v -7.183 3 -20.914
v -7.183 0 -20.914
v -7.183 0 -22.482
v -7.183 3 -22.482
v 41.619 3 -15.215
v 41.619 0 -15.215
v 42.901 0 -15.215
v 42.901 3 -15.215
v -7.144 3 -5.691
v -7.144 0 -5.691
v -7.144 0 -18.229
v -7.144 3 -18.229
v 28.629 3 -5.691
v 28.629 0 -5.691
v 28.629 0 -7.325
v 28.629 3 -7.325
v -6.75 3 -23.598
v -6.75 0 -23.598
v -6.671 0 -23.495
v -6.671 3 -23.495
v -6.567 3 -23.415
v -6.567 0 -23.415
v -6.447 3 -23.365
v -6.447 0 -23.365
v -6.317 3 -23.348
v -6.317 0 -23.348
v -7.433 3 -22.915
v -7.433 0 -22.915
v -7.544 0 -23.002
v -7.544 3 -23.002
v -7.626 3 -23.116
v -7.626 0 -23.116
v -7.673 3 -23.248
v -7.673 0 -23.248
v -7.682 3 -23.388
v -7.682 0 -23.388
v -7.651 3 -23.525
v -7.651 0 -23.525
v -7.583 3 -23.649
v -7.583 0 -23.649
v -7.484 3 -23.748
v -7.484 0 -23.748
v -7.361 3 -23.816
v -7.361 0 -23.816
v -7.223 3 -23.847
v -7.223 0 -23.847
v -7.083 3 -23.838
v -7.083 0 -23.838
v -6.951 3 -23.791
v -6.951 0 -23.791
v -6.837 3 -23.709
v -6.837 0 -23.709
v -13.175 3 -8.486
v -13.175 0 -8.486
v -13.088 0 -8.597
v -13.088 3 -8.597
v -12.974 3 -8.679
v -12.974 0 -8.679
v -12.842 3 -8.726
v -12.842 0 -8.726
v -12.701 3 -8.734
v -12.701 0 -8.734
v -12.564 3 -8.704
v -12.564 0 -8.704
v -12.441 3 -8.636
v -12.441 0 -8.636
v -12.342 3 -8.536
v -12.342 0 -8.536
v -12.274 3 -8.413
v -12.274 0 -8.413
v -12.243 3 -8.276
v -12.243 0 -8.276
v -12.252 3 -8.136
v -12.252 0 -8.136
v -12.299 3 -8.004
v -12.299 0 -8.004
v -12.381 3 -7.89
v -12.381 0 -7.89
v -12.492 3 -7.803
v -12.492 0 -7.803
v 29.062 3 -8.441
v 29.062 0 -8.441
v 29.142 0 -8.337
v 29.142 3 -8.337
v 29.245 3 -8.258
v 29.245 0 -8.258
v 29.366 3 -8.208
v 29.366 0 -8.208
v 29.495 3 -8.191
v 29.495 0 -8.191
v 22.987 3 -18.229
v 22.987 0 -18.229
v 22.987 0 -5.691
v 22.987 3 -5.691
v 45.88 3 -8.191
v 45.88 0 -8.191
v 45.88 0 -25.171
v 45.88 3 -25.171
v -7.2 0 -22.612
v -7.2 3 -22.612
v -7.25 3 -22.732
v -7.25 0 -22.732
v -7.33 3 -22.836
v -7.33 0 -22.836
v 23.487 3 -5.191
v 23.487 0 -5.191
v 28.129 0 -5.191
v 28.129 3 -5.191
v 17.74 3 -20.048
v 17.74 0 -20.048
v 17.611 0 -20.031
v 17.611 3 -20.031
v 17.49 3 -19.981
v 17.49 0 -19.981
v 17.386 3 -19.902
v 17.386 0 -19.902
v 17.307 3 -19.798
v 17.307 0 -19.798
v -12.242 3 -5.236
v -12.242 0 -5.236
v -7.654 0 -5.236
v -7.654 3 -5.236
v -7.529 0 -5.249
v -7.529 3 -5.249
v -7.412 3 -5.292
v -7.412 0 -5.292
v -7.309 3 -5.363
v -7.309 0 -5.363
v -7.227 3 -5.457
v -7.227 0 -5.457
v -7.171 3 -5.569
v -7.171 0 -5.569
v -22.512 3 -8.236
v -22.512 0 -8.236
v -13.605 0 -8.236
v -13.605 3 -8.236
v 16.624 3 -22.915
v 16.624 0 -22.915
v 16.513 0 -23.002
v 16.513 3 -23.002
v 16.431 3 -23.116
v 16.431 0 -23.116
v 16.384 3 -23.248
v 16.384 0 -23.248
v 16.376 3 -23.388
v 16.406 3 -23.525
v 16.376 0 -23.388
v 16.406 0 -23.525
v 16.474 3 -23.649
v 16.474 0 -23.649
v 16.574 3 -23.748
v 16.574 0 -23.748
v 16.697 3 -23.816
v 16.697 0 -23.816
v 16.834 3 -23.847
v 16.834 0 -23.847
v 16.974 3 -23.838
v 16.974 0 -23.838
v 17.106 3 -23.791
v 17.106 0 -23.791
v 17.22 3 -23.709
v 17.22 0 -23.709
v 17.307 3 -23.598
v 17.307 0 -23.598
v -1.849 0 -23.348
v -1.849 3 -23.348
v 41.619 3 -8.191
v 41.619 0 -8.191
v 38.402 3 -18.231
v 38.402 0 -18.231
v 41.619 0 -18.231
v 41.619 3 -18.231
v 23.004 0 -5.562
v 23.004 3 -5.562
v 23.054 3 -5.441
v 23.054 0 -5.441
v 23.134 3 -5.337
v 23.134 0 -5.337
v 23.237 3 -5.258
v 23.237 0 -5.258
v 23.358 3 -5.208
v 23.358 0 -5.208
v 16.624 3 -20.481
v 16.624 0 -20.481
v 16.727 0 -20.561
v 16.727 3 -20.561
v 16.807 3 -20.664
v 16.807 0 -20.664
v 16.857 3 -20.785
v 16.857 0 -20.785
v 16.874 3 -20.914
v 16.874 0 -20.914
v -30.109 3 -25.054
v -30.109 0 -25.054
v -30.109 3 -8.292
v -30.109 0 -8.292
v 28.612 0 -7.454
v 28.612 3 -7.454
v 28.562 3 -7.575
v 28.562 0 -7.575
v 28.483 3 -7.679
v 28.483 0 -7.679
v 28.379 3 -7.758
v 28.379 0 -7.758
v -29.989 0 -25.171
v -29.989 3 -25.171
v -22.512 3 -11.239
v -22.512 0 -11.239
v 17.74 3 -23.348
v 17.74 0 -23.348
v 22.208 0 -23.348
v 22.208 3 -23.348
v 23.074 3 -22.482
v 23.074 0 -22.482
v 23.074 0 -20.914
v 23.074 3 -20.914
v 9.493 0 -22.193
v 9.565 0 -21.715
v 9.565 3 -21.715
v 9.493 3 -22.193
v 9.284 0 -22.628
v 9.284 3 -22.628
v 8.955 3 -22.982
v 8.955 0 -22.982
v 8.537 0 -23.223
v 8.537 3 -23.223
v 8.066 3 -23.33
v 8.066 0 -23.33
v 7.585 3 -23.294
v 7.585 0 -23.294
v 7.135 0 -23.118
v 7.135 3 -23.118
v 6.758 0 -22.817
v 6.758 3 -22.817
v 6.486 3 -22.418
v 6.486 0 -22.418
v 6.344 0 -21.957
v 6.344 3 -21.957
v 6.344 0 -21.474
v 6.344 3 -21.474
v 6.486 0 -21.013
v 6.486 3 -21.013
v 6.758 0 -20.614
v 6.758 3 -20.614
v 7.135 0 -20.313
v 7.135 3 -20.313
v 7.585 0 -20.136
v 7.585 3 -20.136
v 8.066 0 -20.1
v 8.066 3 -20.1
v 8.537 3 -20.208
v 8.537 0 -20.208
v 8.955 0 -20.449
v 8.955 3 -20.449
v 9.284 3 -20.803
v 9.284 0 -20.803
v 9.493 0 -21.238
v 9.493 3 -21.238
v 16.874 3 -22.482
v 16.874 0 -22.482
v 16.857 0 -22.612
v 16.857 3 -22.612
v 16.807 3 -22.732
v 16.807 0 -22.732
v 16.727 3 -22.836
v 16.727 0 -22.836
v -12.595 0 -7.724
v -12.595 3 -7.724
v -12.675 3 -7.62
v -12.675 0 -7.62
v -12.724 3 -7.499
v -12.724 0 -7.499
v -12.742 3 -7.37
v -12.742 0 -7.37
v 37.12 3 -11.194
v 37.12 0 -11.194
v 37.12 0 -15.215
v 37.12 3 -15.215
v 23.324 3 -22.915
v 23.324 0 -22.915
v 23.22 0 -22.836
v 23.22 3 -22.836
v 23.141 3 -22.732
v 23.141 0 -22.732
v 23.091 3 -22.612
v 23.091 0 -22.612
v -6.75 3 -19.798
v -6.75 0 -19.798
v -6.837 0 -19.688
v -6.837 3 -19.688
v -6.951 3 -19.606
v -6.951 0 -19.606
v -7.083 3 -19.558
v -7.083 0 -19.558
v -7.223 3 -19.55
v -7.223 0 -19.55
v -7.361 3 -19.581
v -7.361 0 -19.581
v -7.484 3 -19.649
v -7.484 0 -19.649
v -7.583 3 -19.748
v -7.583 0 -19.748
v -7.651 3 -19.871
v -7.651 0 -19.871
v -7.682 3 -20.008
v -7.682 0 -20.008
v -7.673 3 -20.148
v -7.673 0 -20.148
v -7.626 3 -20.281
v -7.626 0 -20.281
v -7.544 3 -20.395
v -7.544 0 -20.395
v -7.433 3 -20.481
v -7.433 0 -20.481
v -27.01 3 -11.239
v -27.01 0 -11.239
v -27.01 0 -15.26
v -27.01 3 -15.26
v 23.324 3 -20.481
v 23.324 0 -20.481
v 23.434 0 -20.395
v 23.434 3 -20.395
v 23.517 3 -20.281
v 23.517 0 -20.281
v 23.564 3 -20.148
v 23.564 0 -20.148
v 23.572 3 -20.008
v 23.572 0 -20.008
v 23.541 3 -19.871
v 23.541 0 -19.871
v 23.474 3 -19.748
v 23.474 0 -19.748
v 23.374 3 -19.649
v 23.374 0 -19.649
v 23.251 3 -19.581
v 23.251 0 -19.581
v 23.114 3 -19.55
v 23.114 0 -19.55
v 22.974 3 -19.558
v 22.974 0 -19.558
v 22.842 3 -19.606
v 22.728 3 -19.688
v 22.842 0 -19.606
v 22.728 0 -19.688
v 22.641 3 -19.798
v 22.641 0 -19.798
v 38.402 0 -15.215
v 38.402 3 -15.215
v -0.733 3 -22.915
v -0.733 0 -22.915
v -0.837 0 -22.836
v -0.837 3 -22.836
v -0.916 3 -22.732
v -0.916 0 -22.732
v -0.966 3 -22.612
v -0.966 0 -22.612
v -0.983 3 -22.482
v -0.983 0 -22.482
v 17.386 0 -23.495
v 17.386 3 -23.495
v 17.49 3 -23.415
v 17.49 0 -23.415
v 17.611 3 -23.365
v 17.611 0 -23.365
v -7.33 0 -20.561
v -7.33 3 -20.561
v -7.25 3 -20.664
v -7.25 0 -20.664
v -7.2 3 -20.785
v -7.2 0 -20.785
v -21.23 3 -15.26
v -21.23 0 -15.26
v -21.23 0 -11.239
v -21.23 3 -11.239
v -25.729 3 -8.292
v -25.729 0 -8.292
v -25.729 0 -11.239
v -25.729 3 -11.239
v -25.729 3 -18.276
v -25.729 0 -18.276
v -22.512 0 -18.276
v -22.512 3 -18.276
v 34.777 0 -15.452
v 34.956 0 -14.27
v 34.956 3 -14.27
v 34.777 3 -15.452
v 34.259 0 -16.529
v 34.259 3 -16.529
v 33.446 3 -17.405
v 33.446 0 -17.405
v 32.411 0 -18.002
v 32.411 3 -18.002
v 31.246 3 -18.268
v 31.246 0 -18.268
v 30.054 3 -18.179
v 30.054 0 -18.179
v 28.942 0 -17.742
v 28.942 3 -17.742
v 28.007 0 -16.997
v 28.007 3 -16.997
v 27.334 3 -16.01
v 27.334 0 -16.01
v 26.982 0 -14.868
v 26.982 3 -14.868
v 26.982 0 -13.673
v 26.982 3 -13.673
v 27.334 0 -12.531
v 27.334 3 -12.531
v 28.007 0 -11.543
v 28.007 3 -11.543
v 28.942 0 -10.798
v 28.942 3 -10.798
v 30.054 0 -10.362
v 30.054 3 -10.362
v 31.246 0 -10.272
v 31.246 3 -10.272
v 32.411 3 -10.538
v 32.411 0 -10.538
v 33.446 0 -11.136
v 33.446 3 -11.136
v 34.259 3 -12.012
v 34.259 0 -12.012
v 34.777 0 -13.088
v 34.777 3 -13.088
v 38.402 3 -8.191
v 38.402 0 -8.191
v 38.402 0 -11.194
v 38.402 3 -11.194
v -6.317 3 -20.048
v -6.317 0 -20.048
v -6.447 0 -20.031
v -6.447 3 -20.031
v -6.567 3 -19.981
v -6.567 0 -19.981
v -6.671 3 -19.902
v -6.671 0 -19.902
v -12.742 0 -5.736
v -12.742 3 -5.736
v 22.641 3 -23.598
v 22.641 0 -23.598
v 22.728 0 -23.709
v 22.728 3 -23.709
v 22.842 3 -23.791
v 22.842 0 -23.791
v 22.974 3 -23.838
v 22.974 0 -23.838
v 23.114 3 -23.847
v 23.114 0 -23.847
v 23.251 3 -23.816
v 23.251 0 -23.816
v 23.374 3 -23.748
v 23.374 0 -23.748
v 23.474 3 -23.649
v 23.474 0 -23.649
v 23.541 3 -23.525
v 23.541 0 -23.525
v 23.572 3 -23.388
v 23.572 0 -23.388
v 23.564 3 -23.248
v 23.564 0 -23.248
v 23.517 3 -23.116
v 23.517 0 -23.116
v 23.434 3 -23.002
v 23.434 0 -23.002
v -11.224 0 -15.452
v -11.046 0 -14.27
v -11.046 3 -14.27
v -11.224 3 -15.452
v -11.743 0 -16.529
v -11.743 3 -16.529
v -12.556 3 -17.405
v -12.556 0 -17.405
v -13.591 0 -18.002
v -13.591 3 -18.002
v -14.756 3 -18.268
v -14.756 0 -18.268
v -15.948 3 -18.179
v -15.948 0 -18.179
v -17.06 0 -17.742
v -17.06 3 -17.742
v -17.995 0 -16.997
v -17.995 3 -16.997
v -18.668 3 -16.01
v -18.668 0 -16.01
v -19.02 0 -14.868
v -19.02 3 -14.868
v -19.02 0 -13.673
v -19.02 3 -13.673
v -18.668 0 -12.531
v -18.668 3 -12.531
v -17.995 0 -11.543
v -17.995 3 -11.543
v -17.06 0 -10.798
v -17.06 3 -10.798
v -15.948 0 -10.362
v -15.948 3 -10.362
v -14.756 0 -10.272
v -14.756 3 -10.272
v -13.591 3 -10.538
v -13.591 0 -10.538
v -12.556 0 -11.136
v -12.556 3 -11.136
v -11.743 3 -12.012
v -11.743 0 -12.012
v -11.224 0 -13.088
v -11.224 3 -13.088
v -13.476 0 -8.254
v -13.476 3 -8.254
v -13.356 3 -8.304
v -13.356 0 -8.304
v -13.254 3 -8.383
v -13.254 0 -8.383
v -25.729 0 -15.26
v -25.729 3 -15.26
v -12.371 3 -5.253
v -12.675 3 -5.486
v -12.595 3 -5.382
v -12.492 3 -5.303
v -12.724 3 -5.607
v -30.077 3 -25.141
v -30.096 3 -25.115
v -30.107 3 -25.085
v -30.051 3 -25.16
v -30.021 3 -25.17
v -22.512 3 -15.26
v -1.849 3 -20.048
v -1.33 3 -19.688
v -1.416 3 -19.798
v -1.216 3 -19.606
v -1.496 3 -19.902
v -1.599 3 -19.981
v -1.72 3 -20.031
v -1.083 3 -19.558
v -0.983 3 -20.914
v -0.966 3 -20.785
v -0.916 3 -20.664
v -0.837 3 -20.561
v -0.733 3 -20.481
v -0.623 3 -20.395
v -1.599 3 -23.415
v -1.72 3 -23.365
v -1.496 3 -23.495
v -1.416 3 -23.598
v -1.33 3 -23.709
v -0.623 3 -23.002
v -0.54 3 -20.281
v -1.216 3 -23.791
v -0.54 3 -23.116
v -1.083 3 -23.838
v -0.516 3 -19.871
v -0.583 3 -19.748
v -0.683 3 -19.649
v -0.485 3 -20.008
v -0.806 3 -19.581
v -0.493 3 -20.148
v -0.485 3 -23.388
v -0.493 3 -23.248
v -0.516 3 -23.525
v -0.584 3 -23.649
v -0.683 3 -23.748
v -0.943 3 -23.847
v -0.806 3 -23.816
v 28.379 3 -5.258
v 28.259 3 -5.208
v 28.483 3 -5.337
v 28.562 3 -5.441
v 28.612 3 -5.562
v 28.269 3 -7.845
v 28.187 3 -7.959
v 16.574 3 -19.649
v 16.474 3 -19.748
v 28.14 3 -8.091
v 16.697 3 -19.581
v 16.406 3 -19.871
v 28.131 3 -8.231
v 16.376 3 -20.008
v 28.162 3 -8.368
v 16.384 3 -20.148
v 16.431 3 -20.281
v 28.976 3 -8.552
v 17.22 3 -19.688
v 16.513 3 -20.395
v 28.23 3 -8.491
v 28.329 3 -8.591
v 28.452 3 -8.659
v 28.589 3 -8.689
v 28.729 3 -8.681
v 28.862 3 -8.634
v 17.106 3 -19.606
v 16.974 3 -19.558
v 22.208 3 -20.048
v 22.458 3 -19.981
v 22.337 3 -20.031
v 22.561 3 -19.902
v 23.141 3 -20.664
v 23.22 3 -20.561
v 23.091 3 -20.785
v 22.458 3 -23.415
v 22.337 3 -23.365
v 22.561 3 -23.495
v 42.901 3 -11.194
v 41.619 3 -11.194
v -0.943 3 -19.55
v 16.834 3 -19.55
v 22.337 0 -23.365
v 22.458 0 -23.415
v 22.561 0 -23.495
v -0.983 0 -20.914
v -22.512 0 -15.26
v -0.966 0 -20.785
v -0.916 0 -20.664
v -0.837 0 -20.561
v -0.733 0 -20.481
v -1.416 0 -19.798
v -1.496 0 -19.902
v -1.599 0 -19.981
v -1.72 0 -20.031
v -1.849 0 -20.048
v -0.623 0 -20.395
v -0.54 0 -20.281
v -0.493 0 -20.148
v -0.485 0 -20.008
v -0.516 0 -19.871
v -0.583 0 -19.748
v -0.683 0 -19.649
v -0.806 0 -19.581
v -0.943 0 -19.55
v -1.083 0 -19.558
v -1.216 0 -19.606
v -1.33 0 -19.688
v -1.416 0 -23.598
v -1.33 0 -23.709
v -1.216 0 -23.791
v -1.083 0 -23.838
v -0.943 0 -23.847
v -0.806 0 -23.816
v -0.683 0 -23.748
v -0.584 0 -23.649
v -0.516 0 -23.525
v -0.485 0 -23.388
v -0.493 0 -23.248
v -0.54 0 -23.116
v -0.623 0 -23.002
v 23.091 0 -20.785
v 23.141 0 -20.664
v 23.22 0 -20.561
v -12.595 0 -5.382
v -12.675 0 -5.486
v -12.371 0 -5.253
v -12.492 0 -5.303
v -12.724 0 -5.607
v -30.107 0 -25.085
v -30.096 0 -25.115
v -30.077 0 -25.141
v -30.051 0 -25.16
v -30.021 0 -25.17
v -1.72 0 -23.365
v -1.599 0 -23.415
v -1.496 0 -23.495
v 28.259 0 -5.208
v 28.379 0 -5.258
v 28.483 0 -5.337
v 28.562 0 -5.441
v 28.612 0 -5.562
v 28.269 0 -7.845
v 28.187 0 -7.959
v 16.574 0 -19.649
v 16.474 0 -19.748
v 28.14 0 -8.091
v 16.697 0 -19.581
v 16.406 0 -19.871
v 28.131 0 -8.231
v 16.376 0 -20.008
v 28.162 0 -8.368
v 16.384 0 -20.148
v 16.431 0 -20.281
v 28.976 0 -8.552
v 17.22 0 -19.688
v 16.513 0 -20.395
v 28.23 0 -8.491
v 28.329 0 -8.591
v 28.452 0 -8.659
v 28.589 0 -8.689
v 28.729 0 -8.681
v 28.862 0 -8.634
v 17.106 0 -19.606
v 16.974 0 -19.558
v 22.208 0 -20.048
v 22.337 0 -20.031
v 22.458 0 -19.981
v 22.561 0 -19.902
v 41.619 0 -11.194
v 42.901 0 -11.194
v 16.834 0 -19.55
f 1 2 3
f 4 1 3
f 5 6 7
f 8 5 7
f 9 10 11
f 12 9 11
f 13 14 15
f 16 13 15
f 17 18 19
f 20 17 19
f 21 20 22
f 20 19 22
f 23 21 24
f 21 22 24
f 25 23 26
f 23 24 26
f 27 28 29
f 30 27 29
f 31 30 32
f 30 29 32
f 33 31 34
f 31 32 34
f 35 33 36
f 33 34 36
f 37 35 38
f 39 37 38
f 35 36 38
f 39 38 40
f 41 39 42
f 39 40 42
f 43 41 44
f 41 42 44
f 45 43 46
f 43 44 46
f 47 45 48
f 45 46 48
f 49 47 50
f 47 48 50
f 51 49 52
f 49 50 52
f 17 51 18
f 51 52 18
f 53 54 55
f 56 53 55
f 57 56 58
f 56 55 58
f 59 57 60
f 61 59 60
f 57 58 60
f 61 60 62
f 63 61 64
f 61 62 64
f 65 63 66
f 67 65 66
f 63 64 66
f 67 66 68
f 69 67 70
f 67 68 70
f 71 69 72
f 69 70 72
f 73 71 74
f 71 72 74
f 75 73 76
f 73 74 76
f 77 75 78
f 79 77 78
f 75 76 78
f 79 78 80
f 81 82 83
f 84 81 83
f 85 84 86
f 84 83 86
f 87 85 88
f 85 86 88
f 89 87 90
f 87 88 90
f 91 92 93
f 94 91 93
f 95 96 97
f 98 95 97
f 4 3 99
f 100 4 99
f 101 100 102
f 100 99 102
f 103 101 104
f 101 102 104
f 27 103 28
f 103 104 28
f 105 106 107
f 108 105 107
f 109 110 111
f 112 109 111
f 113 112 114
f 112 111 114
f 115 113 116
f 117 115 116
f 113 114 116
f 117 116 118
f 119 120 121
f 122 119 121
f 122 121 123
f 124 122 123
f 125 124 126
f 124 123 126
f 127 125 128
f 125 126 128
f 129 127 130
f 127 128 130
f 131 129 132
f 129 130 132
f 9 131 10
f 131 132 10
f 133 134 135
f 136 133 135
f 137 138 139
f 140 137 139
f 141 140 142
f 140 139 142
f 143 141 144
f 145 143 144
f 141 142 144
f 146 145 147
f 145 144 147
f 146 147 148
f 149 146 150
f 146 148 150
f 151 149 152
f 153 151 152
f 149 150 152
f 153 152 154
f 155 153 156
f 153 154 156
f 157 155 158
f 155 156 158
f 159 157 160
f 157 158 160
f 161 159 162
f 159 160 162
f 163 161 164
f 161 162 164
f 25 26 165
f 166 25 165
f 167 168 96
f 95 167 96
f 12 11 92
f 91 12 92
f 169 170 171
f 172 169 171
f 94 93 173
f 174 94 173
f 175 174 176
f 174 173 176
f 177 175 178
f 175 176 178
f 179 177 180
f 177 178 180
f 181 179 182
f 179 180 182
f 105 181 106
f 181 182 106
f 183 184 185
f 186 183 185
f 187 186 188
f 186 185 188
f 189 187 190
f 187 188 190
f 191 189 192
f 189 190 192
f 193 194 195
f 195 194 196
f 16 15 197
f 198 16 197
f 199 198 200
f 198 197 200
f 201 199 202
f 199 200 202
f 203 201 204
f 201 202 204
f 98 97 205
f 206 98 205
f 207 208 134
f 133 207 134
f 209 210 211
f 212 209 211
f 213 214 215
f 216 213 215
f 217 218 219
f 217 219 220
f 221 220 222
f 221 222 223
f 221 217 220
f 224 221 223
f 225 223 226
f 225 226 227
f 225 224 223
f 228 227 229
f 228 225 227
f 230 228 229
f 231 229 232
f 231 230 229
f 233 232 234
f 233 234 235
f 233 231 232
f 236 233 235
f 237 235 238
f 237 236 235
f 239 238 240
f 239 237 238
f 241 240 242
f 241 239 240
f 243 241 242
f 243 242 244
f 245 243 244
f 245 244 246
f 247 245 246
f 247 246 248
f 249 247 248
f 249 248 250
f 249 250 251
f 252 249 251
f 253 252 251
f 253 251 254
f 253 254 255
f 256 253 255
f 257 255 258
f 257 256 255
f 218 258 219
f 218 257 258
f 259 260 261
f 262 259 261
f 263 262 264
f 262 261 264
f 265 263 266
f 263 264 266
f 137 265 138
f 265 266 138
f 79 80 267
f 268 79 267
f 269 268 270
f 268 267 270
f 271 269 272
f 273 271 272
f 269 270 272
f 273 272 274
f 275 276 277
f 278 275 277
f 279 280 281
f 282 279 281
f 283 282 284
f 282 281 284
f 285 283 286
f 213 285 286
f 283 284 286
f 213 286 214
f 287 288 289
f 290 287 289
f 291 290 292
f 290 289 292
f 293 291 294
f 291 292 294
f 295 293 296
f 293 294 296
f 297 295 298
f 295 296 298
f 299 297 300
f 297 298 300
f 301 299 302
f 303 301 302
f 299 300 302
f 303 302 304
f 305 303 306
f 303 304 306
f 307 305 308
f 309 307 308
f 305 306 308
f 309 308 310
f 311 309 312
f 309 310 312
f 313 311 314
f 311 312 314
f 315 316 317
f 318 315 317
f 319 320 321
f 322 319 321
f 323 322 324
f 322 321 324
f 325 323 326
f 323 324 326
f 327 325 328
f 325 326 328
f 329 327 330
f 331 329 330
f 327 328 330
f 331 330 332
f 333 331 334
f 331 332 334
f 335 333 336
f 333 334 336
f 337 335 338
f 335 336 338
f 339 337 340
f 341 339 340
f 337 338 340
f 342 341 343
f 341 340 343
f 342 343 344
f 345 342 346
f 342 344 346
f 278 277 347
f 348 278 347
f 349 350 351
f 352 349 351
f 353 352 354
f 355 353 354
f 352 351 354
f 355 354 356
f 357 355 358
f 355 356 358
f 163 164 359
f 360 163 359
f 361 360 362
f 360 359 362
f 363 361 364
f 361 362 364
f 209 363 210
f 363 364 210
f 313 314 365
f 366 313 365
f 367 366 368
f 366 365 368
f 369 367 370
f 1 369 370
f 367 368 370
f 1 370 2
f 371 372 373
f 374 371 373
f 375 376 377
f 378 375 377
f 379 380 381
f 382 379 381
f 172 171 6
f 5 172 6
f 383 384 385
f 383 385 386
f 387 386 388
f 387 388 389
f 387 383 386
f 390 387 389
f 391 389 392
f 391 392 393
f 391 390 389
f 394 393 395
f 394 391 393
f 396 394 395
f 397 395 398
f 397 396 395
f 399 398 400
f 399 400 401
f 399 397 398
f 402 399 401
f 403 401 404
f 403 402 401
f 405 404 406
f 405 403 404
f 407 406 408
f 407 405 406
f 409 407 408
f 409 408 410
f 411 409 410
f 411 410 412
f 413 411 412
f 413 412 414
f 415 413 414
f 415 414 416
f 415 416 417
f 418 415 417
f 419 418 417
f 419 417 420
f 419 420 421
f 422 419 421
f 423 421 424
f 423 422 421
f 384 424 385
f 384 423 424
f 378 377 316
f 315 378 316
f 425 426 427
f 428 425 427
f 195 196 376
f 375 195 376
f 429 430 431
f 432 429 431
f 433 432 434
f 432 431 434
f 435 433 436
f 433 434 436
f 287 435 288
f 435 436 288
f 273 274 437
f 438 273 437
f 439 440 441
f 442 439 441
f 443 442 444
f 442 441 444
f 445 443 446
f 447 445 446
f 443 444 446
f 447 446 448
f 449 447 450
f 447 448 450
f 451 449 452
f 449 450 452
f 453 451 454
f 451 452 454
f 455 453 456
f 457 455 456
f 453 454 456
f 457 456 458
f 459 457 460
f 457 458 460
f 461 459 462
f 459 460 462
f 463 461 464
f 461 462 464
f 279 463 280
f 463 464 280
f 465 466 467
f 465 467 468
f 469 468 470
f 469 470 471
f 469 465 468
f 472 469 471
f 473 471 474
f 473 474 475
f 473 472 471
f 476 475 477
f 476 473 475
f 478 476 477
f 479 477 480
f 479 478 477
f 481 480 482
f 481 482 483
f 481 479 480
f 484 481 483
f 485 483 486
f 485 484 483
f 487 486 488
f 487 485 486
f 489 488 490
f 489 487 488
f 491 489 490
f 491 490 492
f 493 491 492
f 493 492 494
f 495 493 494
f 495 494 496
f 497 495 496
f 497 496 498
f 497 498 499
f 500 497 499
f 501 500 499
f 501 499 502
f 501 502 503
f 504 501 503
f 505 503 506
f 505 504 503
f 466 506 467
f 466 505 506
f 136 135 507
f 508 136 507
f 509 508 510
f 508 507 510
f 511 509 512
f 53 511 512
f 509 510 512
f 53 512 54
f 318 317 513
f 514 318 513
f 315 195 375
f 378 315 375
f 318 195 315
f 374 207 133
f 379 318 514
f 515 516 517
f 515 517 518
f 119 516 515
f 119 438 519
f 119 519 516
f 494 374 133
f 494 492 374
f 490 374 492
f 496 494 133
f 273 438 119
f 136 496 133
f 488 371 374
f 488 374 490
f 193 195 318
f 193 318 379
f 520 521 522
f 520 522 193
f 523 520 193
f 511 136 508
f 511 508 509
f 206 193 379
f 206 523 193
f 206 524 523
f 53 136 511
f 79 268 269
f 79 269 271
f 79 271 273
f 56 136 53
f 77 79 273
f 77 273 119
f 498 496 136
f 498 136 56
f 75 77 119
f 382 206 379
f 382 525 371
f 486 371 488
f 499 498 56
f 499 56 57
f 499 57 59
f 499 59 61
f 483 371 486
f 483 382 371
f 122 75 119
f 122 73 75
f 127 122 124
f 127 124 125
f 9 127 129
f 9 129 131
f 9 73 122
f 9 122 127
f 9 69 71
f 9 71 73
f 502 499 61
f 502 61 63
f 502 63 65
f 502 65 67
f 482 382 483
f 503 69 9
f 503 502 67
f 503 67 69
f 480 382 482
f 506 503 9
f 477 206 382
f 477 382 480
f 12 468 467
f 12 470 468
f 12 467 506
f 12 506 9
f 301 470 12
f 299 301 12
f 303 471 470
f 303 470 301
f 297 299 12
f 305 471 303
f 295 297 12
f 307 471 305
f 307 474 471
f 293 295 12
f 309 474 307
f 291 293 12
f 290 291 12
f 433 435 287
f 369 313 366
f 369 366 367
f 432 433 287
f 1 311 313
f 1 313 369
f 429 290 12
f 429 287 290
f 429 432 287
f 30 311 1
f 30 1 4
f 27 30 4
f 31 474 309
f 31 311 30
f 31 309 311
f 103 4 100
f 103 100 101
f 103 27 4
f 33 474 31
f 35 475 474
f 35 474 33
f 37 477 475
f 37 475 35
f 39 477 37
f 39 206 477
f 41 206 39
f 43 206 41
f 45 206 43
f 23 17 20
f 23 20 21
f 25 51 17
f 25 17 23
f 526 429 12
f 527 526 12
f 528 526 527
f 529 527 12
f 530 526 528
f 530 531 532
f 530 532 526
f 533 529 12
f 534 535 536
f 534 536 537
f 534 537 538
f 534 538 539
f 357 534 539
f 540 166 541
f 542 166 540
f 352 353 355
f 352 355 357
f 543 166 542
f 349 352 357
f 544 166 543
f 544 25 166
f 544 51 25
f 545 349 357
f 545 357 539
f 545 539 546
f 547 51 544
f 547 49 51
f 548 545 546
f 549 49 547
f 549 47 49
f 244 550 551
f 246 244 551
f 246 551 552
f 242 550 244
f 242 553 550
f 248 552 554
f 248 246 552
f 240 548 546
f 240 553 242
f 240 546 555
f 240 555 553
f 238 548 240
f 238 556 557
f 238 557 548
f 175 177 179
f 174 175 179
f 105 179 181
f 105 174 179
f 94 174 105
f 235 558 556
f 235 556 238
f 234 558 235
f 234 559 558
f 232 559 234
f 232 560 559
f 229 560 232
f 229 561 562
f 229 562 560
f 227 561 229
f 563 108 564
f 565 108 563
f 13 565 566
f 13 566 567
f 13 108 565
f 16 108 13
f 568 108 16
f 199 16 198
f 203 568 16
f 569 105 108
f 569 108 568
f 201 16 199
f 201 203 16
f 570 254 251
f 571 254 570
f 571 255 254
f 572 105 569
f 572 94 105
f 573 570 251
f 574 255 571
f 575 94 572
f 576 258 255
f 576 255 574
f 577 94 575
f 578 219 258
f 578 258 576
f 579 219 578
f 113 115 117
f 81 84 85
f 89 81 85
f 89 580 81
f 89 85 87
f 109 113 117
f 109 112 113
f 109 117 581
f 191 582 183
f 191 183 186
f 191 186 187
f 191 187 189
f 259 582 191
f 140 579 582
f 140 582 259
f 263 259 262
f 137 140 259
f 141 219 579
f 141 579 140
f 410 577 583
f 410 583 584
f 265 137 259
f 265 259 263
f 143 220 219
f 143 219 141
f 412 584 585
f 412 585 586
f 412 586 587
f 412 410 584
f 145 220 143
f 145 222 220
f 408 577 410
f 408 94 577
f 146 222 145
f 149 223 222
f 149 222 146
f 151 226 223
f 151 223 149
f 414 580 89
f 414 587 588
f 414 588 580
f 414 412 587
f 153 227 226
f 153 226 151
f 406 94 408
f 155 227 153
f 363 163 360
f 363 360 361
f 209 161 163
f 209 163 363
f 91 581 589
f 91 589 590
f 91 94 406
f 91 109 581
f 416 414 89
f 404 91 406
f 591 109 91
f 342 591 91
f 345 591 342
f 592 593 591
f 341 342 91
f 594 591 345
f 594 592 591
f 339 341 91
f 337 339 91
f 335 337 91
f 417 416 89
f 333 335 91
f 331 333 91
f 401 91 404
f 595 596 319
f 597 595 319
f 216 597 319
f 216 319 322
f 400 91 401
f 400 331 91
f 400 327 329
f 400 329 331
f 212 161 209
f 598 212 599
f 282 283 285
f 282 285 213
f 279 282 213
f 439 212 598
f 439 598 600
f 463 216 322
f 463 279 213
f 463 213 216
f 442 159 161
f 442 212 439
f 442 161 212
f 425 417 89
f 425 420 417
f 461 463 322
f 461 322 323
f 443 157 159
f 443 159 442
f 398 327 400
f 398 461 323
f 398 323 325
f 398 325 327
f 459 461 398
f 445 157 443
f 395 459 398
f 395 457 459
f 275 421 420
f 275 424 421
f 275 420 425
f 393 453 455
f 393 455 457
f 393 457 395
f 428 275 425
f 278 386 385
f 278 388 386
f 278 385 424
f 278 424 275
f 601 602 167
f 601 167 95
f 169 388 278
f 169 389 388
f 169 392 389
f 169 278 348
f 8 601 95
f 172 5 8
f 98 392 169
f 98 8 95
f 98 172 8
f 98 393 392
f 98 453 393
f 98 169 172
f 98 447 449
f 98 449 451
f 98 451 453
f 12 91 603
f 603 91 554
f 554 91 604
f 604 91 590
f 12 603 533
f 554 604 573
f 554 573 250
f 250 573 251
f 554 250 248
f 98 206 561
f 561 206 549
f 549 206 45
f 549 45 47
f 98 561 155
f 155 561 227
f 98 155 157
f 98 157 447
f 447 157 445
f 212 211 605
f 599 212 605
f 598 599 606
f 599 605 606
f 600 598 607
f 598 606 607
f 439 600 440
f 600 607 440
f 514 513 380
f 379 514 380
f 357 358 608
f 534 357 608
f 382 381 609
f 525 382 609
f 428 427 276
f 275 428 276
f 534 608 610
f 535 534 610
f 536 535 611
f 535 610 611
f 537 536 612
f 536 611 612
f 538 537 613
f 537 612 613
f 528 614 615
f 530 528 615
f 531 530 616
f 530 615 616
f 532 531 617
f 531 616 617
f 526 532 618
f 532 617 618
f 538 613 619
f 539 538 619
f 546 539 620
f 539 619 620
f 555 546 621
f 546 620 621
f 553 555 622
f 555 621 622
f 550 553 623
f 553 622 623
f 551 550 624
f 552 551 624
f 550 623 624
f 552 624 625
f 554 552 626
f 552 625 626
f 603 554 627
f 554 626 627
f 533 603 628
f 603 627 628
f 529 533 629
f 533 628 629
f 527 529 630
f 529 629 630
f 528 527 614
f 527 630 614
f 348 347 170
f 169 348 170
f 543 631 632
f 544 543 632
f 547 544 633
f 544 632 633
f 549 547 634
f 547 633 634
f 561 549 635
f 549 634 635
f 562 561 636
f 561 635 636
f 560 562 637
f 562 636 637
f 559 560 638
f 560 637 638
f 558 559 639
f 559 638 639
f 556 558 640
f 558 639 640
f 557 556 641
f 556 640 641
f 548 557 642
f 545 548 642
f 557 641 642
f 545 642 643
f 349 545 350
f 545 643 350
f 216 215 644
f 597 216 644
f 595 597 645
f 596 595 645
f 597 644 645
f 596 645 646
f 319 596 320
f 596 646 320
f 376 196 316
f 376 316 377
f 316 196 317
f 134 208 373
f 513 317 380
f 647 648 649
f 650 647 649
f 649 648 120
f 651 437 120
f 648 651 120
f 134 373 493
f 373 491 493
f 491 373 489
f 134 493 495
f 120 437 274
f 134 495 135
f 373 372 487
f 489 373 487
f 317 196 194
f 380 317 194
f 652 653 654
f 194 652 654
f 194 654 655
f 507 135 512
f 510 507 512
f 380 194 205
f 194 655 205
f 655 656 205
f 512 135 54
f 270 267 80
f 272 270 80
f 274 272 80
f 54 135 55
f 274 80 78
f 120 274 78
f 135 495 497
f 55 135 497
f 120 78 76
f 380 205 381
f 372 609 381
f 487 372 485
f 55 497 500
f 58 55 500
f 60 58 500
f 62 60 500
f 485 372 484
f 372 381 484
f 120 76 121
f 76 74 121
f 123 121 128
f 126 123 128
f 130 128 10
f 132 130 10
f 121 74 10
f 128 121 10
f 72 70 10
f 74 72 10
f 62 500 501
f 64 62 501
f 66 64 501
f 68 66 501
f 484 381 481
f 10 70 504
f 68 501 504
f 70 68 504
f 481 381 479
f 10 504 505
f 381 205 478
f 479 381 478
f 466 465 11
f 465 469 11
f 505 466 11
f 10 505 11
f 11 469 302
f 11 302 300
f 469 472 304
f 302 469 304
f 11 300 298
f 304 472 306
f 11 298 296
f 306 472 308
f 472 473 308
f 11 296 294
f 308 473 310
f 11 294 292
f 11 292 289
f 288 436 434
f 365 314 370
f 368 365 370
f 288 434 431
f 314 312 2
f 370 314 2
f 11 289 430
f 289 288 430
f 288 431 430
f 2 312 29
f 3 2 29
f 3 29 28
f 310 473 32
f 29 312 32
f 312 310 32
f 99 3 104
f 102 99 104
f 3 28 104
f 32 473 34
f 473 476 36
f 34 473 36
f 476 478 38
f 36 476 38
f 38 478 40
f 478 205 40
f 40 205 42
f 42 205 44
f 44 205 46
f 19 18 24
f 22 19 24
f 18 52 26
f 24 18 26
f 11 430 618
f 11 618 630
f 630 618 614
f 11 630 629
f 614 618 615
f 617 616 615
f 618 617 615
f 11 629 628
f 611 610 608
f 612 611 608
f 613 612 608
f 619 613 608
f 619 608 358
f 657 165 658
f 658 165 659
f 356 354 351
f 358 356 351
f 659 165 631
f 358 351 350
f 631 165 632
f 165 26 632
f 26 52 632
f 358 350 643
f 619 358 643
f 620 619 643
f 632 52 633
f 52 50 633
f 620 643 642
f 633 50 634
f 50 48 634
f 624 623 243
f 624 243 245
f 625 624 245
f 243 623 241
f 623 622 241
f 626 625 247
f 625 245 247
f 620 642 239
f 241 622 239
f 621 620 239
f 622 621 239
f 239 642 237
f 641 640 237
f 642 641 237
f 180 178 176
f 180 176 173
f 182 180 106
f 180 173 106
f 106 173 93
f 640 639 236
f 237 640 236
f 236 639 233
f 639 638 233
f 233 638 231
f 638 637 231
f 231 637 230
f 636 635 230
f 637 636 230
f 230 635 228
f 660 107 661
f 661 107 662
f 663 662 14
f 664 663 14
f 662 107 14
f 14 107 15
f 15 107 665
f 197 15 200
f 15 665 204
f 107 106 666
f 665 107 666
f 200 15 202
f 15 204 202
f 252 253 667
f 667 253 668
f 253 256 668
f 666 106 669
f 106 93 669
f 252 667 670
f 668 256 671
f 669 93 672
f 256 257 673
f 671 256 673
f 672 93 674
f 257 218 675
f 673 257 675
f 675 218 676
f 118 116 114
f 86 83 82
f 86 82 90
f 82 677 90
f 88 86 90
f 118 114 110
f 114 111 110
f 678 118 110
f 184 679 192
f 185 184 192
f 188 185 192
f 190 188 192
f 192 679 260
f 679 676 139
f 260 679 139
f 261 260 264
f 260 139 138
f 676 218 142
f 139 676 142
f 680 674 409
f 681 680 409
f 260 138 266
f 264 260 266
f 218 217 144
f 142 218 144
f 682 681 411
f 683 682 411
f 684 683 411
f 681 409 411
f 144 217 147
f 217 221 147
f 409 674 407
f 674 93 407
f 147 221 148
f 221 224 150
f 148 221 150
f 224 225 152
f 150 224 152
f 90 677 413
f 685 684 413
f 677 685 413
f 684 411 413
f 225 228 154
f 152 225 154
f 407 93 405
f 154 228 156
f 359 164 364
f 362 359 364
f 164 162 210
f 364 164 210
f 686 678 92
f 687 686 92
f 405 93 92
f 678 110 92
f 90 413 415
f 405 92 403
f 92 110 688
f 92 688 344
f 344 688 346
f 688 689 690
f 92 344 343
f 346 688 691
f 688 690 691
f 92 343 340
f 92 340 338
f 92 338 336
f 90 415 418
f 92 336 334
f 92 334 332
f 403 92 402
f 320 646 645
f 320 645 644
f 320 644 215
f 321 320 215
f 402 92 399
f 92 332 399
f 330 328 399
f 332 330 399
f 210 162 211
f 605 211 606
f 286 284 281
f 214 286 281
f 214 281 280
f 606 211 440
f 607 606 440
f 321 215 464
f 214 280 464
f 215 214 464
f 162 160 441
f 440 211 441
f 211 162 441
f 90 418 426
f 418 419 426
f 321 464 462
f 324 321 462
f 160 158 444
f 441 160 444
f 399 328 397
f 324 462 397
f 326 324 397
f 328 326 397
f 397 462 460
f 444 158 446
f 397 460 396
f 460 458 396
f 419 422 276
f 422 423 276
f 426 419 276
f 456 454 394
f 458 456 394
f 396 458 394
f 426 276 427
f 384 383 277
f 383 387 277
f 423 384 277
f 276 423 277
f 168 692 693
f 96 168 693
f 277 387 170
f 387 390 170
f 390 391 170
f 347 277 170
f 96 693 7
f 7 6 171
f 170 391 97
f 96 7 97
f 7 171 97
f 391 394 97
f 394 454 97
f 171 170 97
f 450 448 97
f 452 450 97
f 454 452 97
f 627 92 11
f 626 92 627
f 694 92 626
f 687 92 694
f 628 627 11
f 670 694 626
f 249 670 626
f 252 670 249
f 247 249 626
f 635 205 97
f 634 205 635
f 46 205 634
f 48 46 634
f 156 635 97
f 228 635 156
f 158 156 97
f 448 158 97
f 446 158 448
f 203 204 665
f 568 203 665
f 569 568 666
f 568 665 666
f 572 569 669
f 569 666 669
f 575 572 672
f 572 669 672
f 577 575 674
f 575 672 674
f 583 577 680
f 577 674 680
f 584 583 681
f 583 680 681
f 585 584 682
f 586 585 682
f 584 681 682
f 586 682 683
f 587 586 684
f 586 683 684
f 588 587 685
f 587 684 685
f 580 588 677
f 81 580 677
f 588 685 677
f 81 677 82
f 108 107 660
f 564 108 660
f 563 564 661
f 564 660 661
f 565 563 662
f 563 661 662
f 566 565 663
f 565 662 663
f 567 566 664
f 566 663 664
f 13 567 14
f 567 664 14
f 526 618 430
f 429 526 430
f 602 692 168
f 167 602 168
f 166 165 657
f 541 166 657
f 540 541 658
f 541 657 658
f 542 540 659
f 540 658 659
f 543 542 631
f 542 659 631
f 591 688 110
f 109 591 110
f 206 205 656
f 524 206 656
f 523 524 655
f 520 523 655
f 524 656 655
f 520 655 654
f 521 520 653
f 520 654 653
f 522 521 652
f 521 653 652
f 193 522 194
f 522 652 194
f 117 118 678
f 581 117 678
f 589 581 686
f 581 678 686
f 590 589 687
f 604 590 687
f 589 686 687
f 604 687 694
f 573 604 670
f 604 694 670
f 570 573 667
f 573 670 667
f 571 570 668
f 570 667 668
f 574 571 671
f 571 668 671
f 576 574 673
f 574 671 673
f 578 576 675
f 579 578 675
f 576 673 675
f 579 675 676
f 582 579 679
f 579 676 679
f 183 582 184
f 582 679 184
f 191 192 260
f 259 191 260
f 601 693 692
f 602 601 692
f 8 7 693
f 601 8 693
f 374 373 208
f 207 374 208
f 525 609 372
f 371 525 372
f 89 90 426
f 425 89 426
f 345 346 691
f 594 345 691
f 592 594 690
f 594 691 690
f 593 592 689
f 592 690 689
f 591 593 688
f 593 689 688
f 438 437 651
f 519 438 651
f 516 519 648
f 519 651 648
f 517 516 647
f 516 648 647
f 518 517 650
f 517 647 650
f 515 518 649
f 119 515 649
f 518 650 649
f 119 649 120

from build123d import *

# Parameters (mm, degrees)
SKETCH1_R           = 4.009255558
SKETCH1_R_2         = 1.619702369
BOSS_EXTRUDE1_DEPTH = 3


with BuildPart() as part:
    # Sketch1 → Boss-Extrude1 (new body)
    with BuildSketch(Plane(origin=(0, 0, 0), x_dir=(1, 0, 0), z_dir=(0, 1, 0))):
        with BuildLine():
            Line((-7.143850408, 18.229298667), (22.987065755, 18.229298667))
            Line((22.987065755, 18.229298667), (22.987065755, 7.324979297))
            Line((22.987065755, 7.324979297), (22.987065755, 5.690951323))
            ThreePointArc((22.987065755, 5.690951323), (23.133512364, 5.337397932), (23.487065755, 5.190951323))
            Line((23.487065755, 5.190951323), (28.129403654, 5.190951323))
            ThreePointArc((28.129403654, 5.190951323), (28.482956988, 5.337397909), (28.629403574, 5.690951243))
            Line((28.629403574, 5.690951243), (28.629403574, 7.324979243))
            ThreePointArc((28.629403574, 7.324979243), (28.56241665, 7.574978633), (28.379404865, 7.757991282))
            ThreePointArc((28.379404865, 7.757991282), (28.275853546, 8.544556775), (29.062418723, 8.441003056))
            ThreePointArc((29.062418723, 8.441003056), (29.245431425, 8.257990354), (29.495431425, 8.191003056))
            Line((29.495431425, 8.191003056), (38.401967533, 8.191003056))
            Line((38.401967533, 8.191003056), (38.401967533, 11.193716571))
            Line((38.401967533, 11.193716571), (37.120165143, 11.193716571))
            Line((37.120165143, 11.193716571), (37.120165143, 15.215104531))
            Line((37.120165143, 15.215104531), (38.40196755, 15.215104531))
            Line((38.40196755, 15.215104531), (38.40196755, 18.231124388))
            Line((38.40196755, 18.231124388), (41.619067462, 18.231124388))
            Line((41.619067462, 18.231124388), (41.619067462, 15.215104531))
            Line((41.619067462, 15.215104531), (42.900869869, 15.215104531))
            Line((42.900869869, 15.215104531), (42.900869869, 11.193716571))
            Line((42.900869869, 11.193716571), (41.619067445, 11.193716571))
            Line((41.619067445, 11.193716571), (41.619067445, 8.191003056))
            Line((41.619067445, 8.191003056), (45.879856116, 8.191003056))
            Line((45.879856116, 8.191003056), (45.879856116, 25.171092004))
            Line((45.879856116, 25.171092004), (-29.989227631, 25.171092004))
            ThreePointArc((-29.989227631, 25.171092004), (-30.077254418, 25.14100432), (-30.109006218, 25.053564013))
            Line((-30.109006218, 25.053564013), (-30.109006218, 8.29196371))
            Line((-30.109006218, 8.29196371), (-25.72867026, 8.29196371))
            Line((-25.72867026, 8.29196371), (-25.72867026, 11.238755399))
            Line((-25.72867026, 11.238755399), (-27.010472684, 11.238755399))
            Line((-27.010472684, 11.238755399), (-27.010472684, 15.260143358))
            Line((-27.010472684, 15.260143358), (-25.728670277, 15.260143358))
            Line((-25.728670277, 15.260143358), (-25.728670277, 18.276163216))
            Line((-25.728670277, 18.276163216), (-22.511570365, 18.276163216))
            Line((-22.511570365, 18.276163216), (-22.511570365, 15.260143358))
            Line((-22.511570365, 15.260143358), (-21.229767957, 15.260143358))
            Line((-21.229767957, 15.260143358), (-21.229767957, 11.238755399))
            Line((-21.229767957, 11.238755399), (-22.511570348, 11.238755399))
            Line((-22.511570348, 11.238755399), (-22.511570348, 8.236041884))
            Line((-22.511570348, 8.236041884), (-13.60503424, 8.236041884))
            ThreePointArc((-13.60503424, 8.236041884), (-13.356468602, 8.303656274), (-13.174549931, 8.486035491))
            ThreePointArc((-13.174549931, 8.486035491), (-12.387984754, 8.58958921), (-12.491536073, 7.803023717))
            ThreePointArc((-12.491536073, 7.803023717), (-12.674547858, 7.620011069), (-12.741534782, 7.370011678))
            Line((-12.741534782, 7.370011678), (-12.741534782, 5.735983678))
            ThreePointArc((-12.741534782, 5.735983678), (-12.595088173, 5.382430288), (-12.241534782, 5.235983678))
            Line((-12.241534782, 5.235983678), (-7.653939136, 5.235983678))
            ThreePointArc((-7.653939136, 5.235983678), (-7.309014548, 5.362697937), (-7.143850408, 5.690951317))
            Line((-7.143850408, 5.690951317), (-7.143850408, 7.324979297))
            Line((-7.143850408, 7.324979297), (-7.143850408, 18.229298667))
        make_face()
        with Locations((-15.055624081, 14.270241393)):
            Circle(SKETCH1_R, mode=Mode.SUBTRACT)
        with Locations((30.946299637, 14.270241393)):
            Circle(SKETCH1_R, mode=Mode.SUBTRACT)
        with BuildLine():
            ThreePointArc((-6.750210098, 23.598159475), (-6.567197449, 23.415147689), (-6.317198059, 23.348160765))
            Line((-6.317198059, 23.348160765), (-1.849249059, 23.348160765))
            ThreePointArc((-1.849249059, 23.348160765), (-1.599248991, 23.415148256), (-1.41623632, 23.598161152))
            ThreePointArc((-1.41623632, 23.598161152), (-0.629670838, 23.701715154), (-0.733222121, 22.915149315))
            ThreePointArc((-0.733222121, 22.915149315), (-0.916234557, 22.73213507), (-0.983220424, 22.482133752))
            Line((-0.983220424, 22.482133752), (-0.983220424, 20.914266752))
            ThreePointArc((-0.983220424, 20.914266752), (-0.916233017, 20.664266494), (-0.733220037, 20.481253678))
            ThreePointArc((-0.733220037, 20.481253678), (-0.629666036, 19.694688196), (-1.416231875, 19.798239479))
            ThreePointArc((-1.416231875, 19.798239479), (-1.599244524, 19.981251265), (-1.849243914, 20.048238189))
            Line((-1.849243914, 20.048238189), (-6.317193914, 20.048238189))
            ThreePointArc((-6.317193914, 20.048238189), (-6.567193914, 19.981250891), (-6.750206616, 19.798238189))
            ThreePointArc((-6.750206616, 19.798238189), (-7.536772071, 19.694684496), (-7.433220534, 20.481250235))
            ThreePointArc((-7.433220534, 20.481250235), (-7.250208657, 20.664263235), (-7.18322203, 20.91426303))
            Line((-7.18322203, 20.91426303), (-7.18322203, 22.48213303))
            ThreePointArc((-7.18322203, 22.48213303), (-7.250209567, 22.732132487), (-7.43322203, 22.915144775))
            ThreePointArc((-7.43322203, 22.915144775), (-7.536776448, 23.701710706), (-6.750210098, 23.598159475))
        make_face(mode=Mode.SUBTRACT)
        with Locations((7.945337781, 21.71531407)):
            Circle(SKETCH1_R_2, mode=Mode.SUBTRACT)
        with BuildLine():
            Line((17.739921148, 23.348159476), (22.207870148, 23.348159476))
            ThreePointArc((22.207870148, 23.348159476), (22.457869729, 23.415146316), (22.640882523, 23.598158186))
            ThreePointArc((22.640882523, 23.598158186), (23.427448874, 23.701709417), (23.323894455, 22.915143486))
            ThreePointArc((23.323894455, 22.915143486), (23.140882484, 22.732132355), (23.073894191, 22.482134307))
            Line((23.073894191, 22.482134307), (23.073894191, 20.914264307))
            ThreePointArc((23.073894191, 20.914264307), (23.140881057, 20.664265055), (23.323892694, 20.481252469))
            ThreePointArc((23.323892694, 20.481252469), (23.427444232, 19.69468673), (22.640878777, 19.798240423))
            ThreePointArc((22.640878777, 19.798240423), (22.457866075, 19.981253125), (22.207866075, 20.048240423))
            Line((22.207866075, 20.048240423), (17.739916075, 20.048240423))
            ThreePointArc((17.739916075, 20.048240423), (17.489916684, 19.981253499), (17.306904036, 19.798241714))
            ThreePointArc((17.306904036, 19.798241714), (16.520338196, 19.69469043), (16.623892198, 20.481255912))
            ThreePointArc((16.623892198, 20.481255912), (16.806904939, 20.664268314), (16.873892585, 20.91426803))
            Line((16.873892585, 20.91426803), (16.873892585, 22.48213503))
            ThreePointArc((16.873892585, 22.48213503), (16.8069059, 22.732134962), (16.623893876, 22.915148025))
            ThreePointArc((16.623893876, 22.915148025), (16.520342592, 23.701713865), (17.306908074, 23.598159863))
            ThreePointArc((17.306908074, 23.598159863), (17.48992089, 23.415146883), (17.739921148, 23.348159476))
        make_face(mode=Mode.SUBTRACT)
    extrude(amount=BOSS_EXTRUDE1_DEPTH)


solid = part.part
